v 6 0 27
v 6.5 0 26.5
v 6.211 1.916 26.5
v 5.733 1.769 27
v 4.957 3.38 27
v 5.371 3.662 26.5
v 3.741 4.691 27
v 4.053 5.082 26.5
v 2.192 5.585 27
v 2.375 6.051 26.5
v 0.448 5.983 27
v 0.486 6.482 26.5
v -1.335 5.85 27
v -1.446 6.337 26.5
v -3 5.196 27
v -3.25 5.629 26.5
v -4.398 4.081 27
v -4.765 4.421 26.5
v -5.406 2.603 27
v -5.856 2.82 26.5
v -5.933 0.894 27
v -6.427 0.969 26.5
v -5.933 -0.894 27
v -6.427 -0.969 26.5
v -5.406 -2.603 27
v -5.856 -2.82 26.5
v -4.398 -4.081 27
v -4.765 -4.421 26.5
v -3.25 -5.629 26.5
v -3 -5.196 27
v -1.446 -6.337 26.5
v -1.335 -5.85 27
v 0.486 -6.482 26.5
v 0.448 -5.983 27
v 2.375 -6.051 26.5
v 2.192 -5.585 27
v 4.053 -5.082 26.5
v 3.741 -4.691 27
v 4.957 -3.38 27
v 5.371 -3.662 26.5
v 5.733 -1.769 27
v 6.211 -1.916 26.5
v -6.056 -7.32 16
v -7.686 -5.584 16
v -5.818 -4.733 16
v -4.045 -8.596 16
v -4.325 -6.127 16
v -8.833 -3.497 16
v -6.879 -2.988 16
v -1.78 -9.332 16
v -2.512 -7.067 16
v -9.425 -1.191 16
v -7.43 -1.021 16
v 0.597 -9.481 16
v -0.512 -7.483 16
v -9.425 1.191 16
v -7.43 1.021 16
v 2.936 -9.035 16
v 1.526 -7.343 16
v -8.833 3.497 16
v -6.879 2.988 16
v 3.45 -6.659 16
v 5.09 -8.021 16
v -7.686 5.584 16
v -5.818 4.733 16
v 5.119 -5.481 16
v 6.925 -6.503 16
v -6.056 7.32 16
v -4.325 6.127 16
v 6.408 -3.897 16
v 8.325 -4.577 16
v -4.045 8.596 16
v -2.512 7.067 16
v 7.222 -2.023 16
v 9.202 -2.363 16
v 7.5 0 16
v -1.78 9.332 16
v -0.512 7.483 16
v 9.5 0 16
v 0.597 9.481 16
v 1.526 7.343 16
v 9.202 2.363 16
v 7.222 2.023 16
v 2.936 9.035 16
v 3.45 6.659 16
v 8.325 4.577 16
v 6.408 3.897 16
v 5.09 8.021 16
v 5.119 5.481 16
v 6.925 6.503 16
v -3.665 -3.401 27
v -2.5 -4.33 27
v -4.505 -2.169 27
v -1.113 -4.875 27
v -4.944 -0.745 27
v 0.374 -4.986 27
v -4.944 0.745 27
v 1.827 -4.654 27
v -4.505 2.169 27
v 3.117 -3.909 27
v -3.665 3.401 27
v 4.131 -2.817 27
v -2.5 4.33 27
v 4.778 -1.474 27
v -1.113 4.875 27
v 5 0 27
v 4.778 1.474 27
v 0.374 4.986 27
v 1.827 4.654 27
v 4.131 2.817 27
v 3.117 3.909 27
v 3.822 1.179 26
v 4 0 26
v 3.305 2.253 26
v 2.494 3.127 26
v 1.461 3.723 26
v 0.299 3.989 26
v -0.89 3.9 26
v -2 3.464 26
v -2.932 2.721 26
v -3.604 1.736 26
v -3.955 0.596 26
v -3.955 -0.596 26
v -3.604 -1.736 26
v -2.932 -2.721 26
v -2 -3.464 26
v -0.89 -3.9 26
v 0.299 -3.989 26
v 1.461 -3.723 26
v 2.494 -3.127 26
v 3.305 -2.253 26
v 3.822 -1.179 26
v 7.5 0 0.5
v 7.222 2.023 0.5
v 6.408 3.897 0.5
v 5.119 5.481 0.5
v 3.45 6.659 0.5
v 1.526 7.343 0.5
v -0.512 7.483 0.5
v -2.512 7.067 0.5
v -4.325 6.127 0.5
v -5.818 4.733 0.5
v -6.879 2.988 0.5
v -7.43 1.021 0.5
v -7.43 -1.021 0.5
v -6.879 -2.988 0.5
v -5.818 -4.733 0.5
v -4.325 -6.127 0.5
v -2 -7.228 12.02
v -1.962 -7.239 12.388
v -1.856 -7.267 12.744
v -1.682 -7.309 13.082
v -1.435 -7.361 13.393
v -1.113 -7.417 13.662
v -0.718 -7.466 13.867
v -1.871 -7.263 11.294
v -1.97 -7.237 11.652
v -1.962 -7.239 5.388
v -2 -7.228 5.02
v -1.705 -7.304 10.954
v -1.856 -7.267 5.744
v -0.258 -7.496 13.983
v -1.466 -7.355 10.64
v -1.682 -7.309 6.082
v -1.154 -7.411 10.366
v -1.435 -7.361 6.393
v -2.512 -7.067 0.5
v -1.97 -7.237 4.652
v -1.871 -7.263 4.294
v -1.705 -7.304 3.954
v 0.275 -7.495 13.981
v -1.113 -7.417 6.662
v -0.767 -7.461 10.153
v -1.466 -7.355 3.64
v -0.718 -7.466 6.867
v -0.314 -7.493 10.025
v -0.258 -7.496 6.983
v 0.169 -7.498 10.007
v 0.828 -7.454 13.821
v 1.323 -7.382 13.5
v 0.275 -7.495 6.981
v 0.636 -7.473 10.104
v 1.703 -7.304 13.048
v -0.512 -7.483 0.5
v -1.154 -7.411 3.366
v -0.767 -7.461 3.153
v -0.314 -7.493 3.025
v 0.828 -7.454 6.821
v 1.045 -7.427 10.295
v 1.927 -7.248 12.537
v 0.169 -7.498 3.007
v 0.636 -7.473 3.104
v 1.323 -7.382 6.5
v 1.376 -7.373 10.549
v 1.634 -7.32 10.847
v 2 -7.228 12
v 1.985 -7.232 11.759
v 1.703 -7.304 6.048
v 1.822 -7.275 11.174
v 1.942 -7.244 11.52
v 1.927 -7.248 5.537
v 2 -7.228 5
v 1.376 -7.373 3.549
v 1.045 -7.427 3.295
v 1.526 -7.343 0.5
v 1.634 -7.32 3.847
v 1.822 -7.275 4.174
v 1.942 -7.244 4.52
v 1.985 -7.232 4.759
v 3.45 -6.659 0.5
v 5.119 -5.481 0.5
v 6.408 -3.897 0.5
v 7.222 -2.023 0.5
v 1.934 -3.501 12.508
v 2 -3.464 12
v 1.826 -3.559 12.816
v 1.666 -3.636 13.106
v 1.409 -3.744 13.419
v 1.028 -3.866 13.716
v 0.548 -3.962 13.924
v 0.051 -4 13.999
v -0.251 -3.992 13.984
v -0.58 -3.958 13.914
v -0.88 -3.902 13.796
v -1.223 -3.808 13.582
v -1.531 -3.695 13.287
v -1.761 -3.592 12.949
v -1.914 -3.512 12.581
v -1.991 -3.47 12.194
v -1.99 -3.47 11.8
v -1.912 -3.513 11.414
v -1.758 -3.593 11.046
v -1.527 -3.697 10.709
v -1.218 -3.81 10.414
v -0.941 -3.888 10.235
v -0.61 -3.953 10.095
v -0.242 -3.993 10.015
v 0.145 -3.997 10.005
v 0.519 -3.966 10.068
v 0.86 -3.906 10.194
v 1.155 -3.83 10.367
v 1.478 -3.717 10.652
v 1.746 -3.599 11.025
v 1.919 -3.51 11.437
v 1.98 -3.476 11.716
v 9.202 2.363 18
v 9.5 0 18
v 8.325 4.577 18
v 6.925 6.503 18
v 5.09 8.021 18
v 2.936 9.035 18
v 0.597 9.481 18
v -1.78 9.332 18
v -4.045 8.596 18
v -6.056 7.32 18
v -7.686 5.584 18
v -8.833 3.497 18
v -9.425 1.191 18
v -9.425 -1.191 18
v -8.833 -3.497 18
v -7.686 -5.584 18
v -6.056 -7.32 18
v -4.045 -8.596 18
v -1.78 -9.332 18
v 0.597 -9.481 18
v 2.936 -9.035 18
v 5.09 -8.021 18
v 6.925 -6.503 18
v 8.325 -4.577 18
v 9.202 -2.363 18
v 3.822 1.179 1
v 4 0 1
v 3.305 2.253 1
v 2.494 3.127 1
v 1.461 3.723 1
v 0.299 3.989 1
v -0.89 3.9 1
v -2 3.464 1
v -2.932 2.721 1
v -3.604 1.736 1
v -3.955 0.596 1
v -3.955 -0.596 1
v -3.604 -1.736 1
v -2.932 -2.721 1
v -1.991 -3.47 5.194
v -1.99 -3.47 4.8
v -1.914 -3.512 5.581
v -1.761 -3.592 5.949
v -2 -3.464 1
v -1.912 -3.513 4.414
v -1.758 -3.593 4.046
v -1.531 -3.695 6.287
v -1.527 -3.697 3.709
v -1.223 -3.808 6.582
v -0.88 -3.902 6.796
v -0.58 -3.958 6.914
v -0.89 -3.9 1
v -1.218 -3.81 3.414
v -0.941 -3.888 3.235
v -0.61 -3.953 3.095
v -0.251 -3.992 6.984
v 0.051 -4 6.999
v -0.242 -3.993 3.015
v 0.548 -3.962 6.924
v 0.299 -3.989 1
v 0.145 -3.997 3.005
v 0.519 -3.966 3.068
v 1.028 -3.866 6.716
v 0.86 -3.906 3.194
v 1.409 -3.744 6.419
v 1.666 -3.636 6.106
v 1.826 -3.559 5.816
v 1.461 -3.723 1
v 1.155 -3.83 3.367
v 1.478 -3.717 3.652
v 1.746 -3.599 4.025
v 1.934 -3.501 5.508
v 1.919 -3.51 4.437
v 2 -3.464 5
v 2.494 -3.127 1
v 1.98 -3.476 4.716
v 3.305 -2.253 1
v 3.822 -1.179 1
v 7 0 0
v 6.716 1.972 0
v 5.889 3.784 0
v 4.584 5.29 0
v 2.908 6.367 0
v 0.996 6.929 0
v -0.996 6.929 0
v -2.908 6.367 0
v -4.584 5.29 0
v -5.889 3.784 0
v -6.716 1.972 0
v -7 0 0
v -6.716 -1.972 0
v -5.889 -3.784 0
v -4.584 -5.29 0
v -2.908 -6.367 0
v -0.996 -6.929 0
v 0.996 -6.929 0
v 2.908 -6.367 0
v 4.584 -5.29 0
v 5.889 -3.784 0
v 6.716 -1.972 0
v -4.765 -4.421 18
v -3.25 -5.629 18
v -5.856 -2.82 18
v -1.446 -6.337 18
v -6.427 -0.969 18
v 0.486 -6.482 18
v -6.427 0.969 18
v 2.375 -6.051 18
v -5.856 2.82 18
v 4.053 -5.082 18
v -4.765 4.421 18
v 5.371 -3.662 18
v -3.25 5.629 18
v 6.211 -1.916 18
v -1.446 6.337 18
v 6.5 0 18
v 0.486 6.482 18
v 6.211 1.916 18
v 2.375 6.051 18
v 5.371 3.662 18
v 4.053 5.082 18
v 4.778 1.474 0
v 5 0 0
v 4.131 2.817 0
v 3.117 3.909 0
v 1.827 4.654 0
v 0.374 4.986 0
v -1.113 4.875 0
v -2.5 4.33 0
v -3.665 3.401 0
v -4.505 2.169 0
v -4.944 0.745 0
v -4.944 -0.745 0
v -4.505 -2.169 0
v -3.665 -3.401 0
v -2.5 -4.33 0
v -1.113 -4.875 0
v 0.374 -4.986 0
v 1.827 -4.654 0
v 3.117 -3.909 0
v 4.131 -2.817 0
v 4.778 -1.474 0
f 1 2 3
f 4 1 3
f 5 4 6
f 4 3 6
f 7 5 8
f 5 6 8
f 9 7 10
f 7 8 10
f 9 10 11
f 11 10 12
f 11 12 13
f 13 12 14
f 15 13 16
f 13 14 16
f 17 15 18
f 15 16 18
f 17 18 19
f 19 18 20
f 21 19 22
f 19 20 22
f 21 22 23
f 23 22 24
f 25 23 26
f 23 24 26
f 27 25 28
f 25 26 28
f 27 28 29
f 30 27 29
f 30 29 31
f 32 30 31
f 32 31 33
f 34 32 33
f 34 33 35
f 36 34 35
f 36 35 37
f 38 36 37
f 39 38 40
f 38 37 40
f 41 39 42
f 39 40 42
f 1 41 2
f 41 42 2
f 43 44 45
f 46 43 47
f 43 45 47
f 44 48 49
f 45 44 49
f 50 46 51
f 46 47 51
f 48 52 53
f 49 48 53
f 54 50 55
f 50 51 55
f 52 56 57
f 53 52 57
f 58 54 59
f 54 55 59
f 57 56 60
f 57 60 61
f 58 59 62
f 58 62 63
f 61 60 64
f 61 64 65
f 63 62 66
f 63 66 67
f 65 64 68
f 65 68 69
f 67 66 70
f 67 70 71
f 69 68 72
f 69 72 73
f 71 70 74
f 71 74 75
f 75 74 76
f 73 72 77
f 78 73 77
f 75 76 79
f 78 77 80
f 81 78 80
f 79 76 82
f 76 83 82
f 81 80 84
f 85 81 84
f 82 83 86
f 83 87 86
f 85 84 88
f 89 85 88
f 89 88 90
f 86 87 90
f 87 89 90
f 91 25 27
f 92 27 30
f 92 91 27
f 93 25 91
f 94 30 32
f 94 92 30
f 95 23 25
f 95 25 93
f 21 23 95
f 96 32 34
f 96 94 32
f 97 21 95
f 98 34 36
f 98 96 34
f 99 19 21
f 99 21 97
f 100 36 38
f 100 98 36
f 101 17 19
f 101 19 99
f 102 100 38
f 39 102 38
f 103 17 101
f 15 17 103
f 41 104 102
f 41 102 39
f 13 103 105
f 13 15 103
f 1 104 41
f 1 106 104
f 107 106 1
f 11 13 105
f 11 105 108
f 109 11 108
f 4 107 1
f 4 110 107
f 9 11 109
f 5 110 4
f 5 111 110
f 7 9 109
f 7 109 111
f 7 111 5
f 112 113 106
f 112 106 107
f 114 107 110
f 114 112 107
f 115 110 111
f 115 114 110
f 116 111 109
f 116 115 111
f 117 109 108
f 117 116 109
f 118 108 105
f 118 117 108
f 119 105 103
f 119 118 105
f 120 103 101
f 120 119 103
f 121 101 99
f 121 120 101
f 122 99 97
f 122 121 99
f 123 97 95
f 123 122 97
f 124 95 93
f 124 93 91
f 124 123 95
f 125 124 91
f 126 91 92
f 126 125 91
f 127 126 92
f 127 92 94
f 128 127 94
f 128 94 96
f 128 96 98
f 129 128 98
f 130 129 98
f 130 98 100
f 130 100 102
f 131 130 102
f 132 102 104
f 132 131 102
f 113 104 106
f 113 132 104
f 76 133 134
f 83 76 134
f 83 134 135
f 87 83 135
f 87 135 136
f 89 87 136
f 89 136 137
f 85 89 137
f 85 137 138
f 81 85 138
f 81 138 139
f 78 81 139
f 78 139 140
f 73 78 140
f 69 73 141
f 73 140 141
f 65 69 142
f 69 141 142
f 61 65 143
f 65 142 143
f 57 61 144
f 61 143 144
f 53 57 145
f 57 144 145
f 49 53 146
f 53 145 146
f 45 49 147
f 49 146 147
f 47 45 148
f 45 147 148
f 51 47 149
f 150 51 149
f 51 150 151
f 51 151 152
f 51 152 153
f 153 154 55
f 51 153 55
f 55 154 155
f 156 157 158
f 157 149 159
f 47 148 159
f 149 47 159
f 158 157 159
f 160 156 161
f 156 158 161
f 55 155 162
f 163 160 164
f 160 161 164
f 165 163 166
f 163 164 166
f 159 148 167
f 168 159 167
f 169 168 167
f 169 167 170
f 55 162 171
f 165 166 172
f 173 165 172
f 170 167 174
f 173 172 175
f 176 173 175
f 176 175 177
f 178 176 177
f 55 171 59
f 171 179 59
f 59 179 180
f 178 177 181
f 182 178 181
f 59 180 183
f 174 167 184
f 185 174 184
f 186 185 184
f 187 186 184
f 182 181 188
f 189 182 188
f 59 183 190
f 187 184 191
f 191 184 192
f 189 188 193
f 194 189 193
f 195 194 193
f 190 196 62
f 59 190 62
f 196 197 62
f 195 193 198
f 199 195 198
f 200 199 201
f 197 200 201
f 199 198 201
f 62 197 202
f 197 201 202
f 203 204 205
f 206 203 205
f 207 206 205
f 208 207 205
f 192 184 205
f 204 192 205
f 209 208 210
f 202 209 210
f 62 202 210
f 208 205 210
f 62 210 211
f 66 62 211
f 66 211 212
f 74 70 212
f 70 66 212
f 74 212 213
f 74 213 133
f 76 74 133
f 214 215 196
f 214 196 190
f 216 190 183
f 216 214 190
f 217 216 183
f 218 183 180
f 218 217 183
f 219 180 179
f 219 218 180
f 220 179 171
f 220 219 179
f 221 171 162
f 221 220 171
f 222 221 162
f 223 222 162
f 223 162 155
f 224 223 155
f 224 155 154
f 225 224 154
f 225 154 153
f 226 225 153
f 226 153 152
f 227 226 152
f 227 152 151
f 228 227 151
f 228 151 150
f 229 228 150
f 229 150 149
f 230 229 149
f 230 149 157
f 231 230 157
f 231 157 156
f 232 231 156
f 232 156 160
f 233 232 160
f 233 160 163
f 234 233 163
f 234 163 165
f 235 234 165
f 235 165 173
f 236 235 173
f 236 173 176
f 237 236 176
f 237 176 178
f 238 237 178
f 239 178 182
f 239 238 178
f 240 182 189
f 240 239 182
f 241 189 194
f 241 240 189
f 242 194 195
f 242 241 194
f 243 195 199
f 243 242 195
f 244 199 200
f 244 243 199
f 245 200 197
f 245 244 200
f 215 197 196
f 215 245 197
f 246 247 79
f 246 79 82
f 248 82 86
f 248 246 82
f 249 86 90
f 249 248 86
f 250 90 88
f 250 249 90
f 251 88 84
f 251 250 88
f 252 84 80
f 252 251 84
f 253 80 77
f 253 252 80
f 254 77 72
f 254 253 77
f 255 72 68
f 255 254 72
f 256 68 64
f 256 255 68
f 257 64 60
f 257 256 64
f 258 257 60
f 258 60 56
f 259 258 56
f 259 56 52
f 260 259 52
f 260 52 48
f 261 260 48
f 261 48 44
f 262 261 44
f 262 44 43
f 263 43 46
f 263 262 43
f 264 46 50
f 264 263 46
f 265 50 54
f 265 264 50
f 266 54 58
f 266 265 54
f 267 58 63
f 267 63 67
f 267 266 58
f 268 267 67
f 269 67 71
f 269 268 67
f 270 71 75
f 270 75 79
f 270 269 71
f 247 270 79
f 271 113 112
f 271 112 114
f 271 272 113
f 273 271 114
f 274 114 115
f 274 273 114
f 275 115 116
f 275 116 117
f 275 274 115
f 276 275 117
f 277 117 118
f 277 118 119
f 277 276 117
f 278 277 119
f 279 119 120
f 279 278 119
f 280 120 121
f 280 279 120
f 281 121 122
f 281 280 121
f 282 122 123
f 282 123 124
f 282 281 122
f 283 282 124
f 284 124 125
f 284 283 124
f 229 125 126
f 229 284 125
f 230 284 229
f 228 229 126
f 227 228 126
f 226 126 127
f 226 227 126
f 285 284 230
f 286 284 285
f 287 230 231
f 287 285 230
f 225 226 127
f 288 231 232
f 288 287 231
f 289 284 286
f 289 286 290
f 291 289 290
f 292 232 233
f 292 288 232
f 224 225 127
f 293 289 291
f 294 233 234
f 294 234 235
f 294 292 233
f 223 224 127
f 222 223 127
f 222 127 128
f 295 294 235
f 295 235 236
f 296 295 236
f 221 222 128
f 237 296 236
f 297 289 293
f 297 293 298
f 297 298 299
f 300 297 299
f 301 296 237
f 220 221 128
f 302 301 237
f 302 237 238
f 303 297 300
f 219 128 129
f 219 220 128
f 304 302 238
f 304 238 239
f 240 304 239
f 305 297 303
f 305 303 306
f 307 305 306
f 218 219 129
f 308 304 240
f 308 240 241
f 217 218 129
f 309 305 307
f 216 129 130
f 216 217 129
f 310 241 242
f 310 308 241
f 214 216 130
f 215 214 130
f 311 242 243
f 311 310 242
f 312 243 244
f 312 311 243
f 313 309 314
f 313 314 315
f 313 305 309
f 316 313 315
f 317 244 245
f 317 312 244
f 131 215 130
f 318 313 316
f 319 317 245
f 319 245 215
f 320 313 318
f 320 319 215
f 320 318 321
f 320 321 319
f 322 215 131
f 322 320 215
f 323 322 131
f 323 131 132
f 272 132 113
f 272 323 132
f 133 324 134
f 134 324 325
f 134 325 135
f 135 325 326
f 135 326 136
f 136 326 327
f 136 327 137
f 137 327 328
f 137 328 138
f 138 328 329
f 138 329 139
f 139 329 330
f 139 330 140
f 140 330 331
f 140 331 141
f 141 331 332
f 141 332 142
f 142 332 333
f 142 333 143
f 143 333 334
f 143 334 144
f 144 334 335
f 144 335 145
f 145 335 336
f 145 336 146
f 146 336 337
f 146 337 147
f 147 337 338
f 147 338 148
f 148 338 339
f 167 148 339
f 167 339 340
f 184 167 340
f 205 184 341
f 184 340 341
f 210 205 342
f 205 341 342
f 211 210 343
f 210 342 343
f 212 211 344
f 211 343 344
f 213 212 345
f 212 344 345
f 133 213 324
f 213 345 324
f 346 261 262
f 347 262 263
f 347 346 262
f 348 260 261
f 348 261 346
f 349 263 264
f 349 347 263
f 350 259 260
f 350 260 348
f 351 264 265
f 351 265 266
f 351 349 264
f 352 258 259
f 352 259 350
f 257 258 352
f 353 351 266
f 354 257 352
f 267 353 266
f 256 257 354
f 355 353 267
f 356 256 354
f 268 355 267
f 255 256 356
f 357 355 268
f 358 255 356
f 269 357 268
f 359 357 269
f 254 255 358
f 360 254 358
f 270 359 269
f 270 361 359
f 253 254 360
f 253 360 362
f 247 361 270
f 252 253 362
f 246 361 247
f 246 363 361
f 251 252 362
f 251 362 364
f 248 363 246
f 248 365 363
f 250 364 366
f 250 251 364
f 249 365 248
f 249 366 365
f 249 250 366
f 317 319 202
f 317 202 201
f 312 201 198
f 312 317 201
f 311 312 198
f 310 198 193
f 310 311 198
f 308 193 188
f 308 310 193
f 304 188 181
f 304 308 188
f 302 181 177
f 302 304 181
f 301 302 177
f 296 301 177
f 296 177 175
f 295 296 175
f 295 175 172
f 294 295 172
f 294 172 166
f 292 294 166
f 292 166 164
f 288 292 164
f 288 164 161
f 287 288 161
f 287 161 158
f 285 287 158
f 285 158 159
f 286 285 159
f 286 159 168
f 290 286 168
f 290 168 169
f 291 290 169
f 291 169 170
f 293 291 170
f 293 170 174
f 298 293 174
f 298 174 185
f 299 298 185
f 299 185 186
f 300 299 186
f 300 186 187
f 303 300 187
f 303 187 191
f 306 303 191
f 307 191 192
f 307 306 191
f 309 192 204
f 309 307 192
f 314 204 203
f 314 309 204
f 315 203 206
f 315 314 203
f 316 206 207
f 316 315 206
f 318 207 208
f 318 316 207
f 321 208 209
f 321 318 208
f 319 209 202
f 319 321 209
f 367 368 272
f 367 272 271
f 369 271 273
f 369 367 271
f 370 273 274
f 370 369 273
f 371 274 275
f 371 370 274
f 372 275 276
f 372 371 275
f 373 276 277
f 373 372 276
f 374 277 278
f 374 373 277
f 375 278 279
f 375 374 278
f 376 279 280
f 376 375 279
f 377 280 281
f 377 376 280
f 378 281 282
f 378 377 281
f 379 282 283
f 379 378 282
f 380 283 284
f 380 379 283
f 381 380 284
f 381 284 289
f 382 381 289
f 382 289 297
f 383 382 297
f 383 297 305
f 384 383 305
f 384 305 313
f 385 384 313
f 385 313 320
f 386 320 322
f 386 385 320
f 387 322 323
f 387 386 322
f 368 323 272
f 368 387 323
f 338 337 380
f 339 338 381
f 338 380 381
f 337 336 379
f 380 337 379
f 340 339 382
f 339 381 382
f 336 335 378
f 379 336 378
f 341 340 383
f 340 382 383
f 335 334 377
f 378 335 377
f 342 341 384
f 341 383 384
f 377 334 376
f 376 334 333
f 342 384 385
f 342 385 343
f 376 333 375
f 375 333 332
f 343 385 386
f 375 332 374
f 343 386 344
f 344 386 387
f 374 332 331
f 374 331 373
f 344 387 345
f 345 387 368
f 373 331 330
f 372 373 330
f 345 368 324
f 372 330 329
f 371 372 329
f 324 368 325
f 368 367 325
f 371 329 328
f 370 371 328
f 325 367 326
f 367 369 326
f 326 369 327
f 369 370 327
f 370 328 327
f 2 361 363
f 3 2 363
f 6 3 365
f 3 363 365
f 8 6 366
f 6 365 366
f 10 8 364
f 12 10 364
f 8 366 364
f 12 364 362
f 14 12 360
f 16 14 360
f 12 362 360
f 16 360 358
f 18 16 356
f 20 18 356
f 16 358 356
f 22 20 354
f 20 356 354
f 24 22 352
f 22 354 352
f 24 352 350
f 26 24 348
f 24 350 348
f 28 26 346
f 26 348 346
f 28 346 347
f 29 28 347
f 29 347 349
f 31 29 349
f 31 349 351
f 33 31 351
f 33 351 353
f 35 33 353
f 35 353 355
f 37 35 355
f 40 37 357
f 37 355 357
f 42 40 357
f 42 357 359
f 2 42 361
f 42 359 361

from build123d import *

# Parameters (mm, degrees)
F0_R     = 7.5
F0_R_2   = 4
F1_DEPTH = 18
F2_R     = 6.5
F2_R_2   = 4
F3_DEPTH = 9
F4_SIZE  = 1
F5_SIZE  = 0.5
F6_R     = 9.5
F6_R_2   = 6.5
F7_DEPTH = 2
F8_R     = 2
F9_DEPTH = 25


with BuildPart() as f1:
    # F0 (on Top) → F1 (new body)
    with BuildSketch(Plane.XY):
        Circle(F0_R)
        Circle(F0_R_2, mode=Mode.SUBTRACT)
    extrude(amount=F1_DEPTH)

    # F2 (on face) → F3 (join)
    with BuildSketch(Plane.XY.offset(18)):
        Circle(F2_R)
        Circle(F2_R_2, mode=Mode.SUBTRACT)
    extrude(amount=F3_DEPTH)

    # F4
    f4_edges = [f1.edges().sort_by_distance(p)[0] for p in [
        (-4, 0, 27),
        (-4, 0, 0),
    ]]
    chamfer(f4_edges, length=F4_SIZE)

    # F5
    f5_edges = [f1.edges().sort_by_distance(p)[0] for p in [
        (-7.5, 0, 0),
        (-6.5, 0, 27),
    ]]
    chamfer(f5_edges, length=F5_SIZE)

    # F6 (on face) → F7 (join)
    with BuildSketch(Plane.XY.offset(18)):
        Circle(F6_R)
        Circle(F6_R_2, mode=Mode.SUBTRACT)
    extrude(amount=-F7_DEPTH)

    # F8 (on Front) → F9 (cut)
    with BuildSketch(Plane.XZ):
        with Locations((0, 5)):
            Circle(F8_R)
        with Locations((0, 12)):
            Circle(F8_R)
    extrude(amount=F9_DEPTH, mode=Mode.SUBTRACT)


solid = f1.part
